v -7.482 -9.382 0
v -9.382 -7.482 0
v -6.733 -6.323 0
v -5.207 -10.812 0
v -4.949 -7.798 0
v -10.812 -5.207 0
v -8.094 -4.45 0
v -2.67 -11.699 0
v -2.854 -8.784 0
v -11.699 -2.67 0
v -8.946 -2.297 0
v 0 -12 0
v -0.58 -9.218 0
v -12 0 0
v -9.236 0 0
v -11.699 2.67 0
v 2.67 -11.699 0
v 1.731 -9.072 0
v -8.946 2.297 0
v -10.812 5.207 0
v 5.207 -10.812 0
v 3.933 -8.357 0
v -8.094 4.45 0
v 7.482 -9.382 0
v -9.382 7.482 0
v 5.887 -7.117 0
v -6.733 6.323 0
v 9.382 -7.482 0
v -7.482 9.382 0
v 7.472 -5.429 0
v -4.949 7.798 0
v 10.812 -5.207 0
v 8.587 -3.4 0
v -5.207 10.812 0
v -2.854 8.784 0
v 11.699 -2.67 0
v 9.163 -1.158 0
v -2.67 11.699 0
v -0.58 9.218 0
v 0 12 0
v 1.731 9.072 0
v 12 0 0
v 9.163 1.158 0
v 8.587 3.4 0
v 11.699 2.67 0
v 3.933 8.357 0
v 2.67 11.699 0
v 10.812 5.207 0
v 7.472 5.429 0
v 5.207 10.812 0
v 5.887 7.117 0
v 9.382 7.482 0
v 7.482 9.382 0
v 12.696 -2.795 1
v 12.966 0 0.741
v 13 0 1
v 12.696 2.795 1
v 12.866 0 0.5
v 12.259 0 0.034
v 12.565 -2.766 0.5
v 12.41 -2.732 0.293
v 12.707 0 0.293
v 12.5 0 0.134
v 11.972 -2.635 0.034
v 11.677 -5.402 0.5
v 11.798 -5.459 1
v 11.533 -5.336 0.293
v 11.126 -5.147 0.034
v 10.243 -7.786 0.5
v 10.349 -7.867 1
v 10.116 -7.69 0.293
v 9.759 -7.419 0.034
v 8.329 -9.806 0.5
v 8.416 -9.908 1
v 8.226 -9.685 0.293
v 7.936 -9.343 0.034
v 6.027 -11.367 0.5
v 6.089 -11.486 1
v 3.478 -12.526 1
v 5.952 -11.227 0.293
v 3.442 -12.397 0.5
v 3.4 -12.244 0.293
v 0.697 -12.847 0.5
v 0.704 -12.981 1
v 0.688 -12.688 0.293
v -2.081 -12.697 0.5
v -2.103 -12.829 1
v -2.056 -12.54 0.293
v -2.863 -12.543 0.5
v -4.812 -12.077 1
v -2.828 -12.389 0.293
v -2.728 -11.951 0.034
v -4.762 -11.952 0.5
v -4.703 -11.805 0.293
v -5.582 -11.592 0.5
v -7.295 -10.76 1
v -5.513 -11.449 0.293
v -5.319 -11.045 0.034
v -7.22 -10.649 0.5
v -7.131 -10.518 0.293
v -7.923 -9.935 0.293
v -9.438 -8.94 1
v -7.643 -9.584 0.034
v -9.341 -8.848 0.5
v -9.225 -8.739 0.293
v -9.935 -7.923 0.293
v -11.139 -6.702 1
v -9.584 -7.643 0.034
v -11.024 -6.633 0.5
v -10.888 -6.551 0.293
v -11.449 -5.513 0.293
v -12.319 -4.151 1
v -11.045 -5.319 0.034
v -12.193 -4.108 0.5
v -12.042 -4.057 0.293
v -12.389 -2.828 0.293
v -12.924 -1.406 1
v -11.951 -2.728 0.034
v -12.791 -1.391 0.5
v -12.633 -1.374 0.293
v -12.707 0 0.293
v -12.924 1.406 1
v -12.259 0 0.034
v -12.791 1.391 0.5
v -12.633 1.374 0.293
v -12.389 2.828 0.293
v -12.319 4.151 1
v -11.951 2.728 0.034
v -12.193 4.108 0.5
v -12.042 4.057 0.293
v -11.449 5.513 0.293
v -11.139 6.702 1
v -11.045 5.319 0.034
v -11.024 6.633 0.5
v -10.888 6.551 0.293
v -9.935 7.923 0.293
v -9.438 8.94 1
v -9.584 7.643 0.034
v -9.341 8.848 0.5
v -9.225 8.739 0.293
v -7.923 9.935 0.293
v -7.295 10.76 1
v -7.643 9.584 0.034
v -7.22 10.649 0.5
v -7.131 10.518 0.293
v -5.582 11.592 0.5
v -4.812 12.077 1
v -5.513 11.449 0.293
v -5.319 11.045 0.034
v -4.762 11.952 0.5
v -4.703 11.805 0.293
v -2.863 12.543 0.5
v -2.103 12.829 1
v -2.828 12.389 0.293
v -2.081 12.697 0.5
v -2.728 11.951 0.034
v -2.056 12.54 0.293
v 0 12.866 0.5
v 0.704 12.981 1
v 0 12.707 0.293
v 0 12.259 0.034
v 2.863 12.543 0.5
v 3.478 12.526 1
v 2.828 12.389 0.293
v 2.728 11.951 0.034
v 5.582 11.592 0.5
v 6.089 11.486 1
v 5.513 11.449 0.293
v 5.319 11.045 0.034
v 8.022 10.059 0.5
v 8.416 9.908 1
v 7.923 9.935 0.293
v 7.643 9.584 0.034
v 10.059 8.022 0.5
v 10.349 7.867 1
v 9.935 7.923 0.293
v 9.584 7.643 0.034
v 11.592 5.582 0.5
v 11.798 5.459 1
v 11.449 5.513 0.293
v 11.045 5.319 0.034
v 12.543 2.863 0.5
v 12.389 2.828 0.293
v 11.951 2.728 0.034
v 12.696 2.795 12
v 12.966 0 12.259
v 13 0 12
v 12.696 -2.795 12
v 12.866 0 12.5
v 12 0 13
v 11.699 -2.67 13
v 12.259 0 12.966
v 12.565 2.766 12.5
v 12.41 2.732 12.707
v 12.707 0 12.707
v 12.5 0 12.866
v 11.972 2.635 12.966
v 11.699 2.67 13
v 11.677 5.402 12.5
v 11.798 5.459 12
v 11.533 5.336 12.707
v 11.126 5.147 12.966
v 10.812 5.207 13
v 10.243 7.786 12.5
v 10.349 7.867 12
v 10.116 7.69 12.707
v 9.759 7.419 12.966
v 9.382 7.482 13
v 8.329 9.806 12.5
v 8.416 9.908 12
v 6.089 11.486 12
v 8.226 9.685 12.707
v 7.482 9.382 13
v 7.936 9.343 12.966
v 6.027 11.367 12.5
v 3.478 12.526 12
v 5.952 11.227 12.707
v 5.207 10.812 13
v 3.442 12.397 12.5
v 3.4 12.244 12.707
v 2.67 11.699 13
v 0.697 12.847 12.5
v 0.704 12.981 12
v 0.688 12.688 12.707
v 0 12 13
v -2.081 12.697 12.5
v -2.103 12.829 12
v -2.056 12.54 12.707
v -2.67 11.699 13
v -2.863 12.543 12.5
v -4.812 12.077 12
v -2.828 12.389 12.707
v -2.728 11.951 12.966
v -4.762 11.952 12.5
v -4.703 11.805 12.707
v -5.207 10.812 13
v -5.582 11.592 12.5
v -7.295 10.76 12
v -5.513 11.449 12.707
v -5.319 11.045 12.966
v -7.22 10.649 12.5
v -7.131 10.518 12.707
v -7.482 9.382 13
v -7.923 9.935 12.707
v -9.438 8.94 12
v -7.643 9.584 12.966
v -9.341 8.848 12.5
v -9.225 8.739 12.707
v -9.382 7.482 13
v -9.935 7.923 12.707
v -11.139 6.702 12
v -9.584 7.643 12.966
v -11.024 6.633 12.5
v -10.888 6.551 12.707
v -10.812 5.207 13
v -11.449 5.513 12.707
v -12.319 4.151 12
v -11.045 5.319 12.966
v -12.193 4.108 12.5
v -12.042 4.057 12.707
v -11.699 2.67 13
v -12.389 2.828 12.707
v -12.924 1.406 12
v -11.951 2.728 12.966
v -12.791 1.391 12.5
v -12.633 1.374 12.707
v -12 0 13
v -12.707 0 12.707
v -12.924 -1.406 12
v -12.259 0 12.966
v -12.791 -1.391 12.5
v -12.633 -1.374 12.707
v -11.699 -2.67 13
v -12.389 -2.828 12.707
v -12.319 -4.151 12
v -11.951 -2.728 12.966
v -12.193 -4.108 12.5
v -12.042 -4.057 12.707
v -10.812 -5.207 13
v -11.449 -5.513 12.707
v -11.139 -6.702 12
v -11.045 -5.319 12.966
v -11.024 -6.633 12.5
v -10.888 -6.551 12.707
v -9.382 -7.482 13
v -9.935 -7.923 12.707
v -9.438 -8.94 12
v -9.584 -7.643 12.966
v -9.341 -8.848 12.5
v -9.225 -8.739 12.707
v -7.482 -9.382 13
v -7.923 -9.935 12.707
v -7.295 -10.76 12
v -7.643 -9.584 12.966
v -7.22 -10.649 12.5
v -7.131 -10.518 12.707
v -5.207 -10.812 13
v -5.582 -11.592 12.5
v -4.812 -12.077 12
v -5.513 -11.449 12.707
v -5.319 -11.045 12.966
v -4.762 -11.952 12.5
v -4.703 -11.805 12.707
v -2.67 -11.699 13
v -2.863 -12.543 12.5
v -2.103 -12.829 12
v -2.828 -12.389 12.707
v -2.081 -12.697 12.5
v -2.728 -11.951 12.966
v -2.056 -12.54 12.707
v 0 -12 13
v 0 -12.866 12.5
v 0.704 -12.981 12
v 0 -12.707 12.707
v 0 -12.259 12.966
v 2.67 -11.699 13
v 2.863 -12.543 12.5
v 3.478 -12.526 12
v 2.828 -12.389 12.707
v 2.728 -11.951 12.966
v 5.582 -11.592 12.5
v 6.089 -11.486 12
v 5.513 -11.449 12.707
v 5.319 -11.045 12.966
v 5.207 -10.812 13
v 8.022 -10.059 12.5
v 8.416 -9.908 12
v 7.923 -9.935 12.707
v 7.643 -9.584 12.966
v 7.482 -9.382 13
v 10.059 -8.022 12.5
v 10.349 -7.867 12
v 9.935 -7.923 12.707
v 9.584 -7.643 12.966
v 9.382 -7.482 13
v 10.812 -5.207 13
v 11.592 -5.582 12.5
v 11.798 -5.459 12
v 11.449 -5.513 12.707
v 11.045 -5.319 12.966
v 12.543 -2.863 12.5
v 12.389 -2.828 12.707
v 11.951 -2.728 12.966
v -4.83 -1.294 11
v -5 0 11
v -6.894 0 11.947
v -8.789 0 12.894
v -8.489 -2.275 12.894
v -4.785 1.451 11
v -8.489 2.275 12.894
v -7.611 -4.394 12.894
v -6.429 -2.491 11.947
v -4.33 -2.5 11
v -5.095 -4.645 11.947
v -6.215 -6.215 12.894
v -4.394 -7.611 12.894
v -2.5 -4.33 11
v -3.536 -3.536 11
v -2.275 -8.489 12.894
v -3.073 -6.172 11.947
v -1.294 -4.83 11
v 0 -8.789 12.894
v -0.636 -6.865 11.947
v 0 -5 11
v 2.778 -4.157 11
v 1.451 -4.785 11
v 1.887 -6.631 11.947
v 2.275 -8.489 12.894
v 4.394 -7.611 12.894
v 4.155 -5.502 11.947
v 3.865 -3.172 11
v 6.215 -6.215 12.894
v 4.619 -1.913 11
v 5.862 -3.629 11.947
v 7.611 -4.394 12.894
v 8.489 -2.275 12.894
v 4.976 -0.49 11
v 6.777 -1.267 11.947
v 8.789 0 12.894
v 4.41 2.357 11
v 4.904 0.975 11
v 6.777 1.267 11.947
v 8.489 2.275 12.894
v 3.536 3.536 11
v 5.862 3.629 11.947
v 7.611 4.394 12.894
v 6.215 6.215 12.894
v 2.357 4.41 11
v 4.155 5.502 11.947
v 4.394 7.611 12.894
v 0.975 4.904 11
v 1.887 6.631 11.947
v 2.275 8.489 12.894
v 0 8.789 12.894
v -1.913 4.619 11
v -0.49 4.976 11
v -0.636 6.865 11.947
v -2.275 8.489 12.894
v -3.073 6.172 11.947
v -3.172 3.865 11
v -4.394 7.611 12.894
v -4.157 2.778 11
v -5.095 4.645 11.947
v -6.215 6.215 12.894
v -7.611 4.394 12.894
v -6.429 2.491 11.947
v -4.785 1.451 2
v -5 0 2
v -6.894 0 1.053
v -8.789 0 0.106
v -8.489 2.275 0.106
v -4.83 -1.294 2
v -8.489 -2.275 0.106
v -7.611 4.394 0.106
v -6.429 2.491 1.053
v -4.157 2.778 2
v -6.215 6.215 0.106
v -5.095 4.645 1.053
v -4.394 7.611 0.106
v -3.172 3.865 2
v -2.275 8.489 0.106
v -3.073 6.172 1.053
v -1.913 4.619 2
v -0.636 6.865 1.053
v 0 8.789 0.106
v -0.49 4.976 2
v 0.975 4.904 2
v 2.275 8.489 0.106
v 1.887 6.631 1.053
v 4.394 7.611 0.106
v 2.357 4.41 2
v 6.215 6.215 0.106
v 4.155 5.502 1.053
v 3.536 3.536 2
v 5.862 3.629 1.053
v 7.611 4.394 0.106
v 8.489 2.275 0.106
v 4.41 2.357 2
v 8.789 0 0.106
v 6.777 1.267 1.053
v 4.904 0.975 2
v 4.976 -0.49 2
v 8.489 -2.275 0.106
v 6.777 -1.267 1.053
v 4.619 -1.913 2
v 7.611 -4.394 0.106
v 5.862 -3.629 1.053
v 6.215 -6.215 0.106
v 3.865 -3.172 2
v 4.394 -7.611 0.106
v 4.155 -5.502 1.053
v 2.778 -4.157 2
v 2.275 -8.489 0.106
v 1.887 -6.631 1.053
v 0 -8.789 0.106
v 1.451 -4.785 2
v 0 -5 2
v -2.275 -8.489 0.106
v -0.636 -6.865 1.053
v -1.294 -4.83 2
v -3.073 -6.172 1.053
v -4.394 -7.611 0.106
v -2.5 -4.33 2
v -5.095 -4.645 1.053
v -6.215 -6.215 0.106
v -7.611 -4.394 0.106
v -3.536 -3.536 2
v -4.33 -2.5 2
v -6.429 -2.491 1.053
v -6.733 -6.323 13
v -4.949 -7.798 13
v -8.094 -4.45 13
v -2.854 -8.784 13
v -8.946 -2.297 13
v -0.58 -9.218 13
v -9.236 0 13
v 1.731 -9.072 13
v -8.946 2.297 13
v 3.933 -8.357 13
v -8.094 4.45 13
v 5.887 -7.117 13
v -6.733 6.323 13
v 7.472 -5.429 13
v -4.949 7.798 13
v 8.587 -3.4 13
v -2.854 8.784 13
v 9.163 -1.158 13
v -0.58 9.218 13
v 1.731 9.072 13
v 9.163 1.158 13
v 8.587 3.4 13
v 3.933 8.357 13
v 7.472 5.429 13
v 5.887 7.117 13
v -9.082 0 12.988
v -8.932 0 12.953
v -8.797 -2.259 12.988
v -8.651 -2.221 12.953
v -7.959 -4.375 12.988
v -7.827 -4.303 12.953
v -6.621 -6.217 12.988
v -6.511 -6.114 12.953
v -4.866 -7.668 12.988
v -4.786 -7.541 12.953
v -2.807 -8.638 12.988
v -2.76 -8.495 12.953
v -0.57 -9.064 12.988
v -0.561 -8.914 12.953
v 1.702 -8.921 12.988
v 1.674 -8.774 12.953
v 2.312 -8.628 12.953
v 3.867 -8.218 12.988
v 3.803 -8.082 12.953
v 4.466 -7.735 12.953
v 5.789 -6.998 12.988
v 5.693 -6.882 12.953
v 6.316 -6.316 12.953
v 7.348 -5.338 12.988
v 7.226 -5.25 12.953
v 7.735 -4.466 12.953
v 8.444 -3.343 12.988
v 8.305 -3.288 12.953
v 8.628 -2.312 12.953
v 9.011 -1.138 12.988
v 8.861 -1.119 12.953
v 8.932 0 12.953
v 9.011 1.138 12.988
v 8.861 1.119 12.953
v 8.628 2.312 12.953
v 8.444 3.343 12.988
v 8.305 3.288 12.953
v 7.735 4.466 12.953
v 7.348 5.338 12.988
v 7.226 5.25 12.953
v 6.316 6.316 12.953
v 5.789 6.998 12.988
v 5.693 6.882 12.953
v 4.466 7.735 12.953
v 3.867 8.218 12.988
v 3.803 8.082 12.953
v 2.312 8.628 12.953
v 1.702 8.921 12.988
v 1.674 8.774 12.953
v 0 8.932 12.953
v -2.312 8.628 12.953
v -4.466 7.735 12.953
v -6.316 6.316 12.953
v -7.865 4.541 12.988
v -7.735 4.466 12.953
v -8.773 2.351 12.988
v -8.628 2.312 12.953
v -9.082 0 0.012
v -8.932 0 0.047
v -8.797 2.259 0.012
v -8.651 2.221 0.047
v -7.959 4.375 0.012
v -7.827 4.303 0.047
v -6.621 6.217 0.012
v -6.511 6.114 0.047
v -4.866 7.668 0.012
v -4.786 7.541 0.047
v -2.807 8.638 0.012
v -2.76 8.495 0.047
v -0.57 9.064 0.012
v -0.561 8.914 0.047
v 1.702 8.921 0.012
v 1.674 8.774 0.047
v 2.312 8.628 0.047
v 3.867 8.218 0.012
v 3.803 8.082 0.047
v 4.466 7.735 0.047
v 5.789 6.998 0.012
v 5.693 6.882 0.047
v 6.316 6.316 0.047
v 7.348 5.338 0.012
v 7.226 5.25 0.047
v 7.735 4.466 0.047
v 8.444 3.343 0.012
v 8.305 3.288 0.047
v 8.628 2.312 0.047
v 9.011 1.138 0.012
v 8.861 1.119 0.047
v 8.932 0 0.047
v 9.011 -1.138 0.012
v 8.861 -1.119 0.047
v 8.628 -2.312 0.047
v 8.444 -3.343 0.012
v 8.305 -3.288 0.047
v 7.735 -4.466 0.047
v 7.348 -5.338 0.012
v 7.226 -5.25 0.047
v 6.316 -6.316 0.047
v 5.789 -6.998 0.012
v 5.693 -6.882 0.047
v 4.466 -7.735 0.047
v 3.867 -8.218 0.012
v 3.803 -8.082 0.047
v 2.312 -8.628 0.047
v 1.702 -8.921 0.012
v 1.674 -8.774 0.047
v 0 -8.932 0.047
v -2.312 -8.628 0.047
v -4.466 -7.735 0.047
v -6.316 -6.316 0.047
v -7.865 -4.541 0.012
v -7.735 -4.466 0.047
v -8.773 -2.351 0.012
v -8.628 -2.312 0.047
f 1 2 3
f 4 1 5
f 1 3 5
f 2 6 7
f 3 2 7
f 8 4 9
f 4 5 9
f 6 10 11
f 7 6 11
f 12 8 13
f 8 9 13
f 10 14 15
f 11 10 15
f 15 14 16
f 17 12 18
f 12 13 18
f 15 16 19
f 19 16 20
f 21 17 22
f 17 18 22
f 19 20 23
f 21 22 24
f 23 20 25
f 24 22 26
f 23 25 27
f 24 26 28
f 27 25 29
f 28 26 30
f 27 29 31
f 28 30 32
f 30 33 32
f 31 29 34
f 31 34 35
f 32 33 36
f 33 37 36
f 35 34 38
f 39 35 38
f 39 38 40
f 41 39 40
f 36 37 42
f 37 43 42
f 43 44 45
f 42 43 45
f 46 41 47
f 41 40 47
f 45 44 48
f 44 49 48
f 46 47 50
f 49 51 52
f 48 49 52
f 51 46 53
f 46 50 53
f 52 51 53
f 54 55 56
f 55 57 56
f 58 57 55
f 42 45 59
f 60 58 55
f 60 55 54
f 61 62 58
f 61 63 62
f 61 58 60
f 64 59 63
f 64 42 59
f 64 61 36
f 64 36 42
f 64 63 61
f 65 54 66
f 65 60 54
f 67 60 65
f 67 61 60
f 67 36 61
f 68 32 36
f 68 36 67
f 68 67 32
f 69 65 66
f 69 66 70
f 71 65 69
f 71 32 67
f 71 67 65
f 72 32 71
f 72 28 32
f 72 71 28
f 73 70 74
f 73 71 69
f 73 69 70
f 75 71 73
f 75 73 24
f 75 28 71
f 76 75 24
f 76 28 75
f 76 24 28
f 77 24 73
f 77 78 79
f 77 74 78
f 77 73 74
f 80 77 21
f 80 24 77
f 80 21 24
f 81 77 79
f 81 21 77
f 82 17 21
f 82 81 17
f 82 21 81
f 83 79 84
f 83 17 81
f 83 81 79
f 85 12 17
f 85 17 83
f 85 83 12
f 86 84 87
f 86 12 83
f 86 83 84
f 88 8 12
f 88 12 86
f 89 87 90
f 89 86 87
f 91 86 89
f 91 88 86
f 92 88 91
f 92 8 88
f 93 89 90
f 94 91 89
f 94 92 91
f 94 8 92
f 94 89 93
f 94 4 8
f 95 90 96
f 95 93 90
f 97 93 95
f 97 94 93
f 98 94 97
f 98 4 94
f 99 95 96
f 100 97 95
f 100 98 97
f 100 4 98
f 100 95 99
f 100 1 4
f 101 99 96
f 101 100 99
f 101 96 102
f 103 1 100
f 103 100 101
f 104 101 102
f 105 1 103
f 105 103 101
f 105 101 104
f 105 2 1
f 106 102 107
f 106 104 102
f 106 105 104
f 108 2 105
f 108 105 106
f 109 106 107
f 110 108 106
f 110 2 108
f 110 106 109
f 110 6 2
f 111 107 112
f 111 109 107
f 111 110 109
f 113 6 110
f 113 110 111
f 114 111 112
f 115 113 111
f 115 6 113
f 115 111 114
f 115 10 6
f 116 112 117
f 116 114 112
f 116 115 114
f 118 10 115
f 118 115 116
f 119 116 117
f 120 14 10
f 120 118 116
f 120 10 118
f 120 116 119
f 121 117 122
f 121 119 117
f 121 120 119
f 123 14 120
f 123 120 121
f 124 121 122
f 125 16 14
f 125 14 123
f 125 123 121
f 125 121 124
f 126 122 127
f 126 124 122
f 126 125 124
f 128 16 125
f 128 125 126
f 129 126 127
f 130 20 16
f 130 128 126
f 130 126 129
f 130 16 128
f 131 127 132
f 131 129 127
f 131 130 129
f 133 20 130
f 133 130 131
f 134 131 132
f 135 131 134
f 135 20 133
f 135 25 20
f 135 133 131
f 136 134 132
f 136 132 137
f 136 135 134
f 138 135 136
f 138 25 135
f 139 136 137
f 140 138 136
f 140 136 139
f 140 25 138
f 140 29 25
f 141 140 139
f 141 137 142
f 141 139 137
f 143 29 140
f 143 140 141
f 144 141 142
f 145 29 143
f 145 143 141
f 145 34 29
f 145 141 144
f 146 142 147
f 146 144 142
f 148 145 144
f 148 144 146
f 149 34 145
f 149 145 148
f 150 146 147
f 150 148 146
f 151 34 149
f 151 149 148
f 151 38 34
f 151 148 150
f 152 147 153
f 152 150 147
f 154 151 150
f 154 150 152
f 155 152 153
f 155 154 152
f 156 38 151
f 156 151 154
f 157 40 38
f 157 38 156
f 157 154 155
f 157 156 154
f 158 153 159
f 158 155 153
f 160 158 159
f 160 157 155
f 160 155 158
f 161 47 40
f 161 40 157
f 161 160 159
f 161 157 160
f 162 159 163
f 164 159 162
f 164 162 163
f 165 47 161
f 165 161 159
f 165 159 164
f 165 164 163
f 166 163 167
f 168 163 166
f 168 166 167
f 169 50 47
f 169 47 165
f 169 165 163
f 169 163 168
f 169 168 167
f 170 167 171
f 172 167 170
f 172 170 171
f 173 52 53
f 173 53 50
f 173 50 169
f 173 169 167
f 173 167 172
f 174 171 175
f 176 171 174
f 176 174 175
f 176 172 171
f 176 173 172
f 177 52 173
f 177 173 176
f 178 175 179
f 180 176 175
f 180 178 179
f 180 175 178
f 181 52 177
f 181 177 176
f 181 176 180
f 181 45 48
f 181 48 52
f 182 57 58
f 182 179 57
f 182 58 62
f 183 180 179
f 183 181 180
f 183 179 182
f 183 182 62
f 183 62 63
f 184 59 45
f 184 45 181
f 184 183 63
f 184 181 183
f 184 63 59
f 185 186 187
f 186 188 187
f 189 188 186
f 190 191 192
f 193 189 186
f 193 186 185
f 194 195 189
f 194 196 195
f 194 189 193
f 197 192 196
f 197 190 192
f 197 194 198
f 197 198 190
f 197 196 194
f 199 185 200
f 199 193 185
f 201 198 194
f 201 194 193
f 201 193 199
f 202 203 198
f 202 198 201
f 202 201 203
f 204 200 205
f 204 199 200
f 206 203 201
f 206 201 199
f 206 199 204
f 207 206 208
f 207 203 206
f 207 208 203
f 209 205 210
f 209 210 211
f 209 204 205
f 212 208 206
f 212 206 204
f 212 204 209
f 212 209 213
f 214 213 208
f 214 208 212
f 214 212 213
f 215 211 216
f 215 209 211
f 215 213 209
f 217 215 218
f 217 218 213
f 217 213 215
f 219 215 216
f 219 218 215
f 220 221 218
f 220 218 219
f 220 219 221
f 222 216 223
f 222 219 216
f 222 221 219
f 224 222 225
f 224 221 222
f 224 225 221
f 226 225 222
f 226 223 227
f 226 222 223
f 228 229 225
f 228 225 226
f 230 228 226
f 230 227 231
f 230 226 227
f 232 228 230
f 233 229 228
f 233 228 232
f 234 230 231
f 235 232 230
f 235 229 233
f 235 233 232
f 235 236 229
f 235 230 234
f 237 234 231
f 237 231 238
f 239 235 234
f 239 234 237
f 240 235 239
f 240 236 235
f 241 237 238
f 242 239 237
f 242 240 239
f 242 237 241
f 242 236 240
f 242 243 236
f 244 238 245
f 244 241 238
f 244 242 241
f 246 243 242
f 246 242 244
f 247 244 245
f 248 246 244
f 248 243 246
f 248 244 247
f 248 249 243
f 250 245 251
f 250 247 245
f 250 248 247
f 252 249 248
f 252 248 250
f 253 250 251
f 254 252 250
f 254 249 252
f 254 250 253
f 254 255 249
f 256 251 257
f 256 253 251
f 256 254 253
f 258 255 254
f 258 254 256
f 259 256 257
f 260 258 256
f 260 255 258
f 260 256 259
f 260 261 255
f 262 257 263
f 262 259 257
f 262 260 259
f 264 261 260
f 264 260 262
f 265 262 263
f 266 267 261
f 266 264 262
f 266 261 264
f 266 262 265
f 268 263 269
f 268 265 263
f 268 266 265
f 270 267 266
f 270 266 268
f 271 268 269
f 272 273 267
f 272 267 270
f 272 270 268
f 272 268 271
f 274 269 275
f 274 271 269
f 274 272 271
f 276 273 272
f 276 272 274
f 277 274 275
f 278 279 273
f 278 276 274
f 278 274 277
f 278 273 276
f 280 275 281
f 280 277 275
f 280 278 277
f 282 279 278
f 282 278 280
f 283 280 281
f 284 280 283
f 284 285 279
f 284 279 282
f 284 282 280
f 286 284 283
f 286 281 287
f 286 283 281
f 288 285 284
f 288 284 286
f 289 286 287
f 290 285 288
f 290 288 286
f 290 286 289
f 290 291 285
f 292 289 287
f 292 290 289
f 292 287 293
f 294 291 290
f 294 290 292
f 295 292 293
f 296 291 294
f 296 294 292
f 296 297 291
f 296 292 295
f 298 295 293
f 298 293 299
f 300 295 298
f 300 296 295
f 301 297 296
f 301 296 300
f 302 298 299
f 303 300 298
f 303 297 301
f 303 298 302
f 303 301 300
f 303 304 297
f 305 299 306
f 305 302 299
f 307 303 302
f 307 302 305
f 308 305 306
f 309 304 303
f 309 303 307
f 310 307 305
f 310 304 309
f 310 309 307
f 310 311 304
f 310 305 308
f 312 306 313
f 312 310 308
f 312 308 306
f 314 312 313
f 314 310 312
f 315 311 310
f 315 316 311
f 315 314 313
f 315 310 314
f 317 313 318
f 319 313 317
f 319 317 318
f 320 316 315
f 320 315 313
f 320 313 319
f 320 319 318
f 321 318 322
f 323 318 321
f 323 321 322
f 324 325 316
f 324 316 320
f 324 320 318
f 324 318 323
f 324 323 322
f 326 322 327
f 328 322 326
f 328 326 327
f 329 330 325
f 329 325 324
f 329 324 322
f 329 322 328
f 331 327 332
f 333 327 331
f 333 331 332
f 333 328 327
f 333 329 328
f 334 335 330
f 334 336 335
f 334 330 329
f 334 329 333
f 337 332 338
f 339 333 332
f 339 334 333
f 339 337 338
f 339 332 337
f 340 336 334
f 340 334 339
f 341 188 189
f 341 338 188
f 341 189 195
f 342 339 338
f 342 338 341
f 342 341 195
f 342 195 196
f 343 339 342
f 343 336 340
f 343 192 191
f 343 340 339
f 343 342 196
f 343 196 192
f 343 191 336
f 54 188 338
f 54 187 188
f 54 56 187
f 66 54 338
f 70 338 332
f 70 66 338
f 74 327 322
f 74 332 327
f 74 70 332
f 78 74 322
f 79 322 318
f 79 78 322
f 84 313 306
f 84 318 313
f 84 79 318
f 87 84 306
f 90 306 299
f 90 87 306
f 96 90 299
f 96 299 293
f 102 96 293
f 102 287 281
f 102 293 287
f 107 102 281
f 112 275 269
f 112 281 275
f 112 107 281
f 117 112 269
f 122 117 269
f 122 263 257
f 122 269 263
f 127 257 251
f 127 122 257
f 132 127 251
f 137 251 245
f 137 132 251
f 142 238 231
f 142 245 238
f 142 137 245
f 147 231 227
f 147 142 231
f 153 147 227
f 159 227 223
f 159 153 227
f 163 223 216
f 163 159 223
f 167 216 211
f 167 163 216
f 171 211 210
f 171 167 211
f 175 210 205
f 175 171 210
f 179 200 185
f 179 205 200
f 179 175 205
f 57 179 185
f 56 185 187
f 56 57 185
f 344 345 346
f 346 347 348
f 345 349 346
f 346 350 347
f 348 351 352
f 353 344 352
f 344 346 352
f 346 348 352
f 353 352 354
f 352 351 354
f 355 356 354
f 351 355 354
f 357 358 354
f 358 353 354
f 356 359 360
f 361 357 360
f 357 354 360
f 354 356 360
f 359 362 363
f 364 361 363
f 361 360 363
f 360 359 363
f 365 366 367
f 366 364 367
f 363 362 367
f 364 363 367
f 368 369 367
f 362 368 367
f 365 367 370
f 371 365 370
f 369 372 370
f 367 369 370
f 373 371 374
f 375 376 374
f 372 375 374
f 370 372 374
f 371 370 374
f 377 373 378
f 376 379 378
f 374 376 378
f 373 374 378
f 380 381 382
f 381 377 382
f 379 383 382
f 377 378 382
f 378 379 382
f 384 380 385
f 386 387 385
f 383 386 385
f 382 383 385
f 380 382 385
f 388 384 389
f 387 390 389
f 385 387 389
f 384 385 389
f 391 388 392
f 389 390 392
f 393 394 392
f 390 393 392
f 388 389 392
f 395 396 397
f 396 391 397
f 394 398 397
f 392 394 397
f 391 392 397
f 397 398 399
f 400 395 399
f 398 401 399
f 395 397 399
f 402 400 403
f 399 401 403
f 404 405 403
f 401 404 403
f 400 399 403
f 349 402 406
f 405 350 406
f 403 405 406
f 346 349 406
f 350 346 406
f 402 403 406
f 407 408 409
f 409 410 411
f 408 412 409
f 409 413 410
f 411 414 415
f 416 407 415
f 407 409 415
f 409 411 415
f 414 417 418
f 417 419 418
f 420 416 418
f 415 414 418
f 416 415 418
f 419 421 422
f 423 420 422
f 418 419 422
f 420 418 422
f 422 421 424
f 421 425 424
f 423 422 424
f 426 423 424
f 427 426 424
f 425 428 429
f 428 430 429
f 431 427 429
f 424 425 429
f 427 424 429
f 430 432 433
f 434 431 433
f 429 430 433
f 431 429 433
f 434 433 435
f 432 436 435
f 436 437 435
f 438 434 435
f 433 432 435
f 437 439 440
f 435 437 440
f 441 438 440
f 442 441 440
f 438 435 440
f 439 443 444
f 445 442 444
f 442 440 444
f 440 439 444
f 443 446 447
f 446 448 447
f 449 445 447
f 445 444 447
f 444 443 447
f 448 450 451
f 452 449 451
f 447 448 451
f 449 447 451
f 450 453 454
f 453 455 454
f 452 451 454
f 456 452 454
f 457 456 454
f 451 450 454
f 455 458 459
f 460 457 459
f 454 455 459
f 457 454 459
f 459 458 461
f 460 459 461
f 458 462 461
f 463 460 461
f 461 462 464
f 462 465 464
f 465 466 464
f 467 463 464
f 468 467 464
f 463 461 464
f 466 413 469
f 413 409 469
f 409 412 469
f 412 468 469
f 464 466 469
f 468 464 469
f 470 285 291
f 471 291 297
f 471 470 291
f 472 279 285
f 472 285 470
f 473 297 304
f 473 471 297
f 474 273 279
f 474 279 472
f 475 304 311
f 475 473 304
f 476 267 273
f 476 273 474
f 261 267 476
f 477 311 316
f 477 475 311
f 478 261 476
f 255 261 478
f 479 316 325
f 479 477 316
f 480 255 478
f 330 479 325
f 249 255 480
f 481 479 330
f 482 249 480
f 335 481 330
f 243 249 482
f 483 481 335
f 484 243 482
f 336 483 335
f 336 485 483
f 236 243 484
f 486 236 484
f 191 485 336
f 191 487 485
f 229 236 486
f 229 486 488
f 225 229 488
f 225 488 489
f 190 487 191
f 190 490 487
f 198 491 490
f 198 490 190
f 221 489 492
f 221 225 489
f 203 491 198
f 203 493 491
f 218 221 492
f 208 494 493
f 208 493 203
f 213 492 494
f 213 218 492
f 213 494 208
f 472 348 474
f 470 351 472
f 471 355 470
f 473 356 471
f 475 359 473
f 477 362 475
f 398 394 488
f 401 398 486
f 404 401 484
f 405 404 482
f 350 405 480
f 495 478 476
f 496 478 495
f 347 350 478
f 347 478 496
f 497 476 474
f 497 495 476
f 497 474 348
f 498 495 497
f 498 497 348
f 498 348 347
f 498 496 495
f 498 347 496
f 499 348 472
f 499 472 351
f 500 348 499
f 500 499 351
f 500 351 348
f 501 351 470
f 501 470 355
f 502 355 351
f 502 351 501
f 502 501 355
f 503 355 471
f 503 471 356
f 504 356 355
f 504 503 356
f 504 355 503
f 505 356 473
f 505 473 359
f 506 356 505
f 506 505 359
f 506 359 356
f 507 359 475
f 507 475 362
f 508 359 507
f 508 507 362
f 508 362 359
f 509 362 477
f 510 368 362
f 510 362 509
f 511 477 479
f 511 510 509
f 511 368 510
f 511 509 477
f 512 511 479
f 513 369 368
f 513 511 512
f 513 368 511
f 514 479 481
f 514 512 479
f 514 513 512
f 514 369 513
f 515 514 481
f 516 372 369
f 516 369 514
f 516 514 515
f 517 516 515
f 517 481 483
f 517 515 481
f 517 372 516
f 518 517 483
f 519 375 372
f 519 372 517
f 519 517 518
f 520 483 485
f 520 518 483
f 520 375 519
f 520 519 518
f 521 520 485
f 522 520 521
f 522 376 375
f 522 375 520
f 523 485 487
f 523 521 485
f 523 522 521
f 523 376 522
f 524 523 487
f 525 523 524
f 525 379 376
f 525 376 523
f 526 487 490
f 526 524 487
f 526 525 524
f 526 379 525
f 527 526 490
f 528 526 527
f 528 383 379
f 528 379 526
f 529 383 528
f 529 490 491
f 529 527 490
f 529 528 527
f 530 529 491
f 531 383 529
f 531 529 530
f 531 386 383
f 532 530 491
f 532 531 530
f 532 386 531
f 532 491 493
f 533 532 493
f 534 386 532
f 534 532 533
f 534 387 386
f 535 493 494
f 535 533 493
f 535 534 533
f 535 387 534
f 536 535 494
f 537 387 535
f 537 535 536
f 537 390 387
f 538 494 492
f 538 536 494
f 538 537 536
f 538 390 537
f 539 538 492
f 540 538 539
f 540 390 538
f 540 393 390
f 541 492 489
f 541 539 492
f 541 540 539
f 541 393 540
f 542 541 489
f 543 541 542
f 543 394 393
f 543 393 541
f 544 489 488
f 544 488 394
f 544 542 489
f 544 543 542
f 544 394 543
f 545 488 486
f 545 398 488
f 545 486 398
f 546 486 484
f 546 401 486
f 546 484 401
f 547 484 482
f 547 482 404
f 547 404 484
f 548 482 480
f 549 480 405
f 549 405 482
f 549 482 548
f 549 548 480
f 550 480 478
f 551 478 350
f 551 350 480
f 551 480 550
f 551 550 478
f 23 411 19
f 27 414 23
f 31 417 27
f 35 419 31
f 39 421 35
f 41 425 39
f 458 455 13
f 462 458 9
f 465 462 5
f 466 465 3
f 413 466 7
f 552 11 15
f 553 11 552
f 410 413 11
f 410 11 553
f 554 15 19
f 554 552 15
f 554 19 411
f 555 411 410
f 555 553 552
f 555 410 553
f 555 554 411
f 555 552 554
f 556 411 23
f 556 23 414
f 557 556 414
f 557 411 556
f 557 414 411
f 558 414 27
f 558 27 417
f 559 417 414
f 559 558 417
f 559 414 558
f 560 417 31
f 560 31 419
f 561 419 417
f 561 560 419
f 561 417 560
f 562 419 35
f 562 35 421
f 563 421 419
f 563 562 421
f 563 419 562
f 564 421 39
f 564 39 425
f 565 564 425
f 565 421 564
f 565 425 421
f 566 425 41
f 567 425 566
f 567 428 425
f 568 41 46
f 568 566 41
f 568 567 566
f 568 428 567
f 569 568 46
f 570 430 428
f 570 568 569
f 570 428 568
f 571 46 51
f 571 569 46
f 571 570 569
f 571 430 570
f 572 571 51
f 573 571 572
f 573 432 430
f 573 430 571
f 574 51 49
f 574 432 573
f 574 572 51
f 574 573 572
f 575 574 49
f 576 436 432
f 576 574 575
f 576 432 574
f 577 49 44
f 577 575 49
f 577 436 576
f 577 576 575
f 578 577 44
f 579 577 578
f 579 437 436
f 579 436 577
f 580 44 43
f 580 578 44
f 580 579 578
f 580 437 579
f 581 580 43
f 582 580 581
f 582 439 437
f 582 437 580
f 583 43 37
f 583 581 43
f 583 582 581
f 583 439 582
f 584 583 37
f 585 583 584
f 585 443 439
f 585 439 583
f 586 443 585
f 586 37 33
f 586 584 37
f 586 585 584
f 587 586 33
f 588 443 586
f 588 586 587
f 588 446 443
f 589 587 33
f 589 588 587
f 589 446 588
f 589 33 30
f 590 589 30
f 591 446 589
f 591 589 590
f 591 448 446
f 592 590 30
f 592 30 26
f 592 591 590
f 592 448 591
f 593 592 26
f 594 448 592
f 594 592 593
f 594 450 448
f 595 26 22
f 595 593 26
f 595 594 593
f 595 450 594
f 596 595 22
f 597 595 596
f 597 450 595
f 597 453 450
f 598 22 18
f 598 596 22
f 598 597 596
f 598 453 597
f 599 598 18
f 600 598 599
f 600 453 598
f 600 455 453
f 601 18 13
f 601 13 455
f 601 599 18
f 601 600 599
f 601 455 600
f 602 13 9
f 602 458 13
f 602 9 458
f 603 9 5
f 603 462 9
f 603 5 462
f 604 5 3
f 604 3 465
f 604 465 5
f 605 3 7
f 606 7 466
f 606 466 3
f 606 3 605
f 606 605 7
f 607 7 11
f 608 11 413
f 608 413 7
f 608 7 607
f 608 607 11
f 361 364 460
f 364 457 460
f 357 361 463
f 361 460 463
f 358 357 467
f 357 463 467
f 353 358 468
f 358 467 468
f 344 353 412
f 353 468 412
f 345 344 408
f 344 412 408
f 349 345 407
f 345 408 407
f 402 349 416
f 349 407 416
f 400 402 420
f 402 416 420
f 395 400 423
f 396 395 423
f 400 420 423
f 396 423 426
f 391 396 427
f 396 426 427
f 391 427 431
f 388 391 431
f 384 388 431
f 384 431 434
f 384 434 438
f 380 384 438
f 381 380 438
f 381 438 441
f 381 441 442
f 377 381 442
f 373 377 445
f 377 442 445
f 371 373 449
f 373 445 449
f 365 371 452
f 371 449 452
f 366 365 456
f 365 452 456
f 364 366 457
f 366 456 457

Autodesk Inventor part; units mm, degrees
ref_plane "YZ Plane" through (0, 0, 0) normal (1, 0, 0) x (0, 1, 0)
ref_plane "XZ Plane" through (0, 0, 0) normal (0, 1, 0) x (-1, 0, 0)
sketch "Sketch1" plane through (0, 0, 0) normal (0, 0, 1) x (1, 0, 0)
  circle A0 centre (0, 0) radius 13
  dimension "d0" = 26
extrude "Extrusion1" add sketch "Sketch1" along normal blind 13
sketch "Sketch2" plane through (0, 0, 13) normal (0, 0, 1) x (1, 0, 0)
  circle A0 centre (0, 0) radius 13 projected
hole "Hole1" at (0, 0, 13) direction (0, 0, -1) diameter 10 end through all
sketch "Sketch3" plane through (0, 0, 0) normal (0, 1, 0) x (-1, 0, 0)
  line L0 (0, 13) -> (0, 0)
  line L1 (-5, 13) -> (5, 13) projected
  line L2 (13, 13) -> (-13, 13) projected
  line L3 (5, 0) -> (5, 13) projected
  line L4 (5, 11) -> (9, 13)
  line L5 (9, 13) -> (5, 13)
  line L6 (5, 13) -> (5, 11)
  dimension "d10" = 2
  dimension "d11" = 4
revolve "Revolution1" cut sketch "Sketch3" angle 360 about axis through (0, 0, 13) along (0, 0, -1)
ref_plane "Work Plane1" through (0, 0, 6.5) normal (0, 0, 1) x (1, 0, 0)
mirror "Mirror1" about plane through (0, 0, 6.5) normal (0, 0, 1) of "Revolution1"
fillet "Fillet1" radius 1 4 edges at (-13, 0, 0) (9, 0, 0) (-13, 0, 13) (9, 0, 13)
properties part number "Wheel"
